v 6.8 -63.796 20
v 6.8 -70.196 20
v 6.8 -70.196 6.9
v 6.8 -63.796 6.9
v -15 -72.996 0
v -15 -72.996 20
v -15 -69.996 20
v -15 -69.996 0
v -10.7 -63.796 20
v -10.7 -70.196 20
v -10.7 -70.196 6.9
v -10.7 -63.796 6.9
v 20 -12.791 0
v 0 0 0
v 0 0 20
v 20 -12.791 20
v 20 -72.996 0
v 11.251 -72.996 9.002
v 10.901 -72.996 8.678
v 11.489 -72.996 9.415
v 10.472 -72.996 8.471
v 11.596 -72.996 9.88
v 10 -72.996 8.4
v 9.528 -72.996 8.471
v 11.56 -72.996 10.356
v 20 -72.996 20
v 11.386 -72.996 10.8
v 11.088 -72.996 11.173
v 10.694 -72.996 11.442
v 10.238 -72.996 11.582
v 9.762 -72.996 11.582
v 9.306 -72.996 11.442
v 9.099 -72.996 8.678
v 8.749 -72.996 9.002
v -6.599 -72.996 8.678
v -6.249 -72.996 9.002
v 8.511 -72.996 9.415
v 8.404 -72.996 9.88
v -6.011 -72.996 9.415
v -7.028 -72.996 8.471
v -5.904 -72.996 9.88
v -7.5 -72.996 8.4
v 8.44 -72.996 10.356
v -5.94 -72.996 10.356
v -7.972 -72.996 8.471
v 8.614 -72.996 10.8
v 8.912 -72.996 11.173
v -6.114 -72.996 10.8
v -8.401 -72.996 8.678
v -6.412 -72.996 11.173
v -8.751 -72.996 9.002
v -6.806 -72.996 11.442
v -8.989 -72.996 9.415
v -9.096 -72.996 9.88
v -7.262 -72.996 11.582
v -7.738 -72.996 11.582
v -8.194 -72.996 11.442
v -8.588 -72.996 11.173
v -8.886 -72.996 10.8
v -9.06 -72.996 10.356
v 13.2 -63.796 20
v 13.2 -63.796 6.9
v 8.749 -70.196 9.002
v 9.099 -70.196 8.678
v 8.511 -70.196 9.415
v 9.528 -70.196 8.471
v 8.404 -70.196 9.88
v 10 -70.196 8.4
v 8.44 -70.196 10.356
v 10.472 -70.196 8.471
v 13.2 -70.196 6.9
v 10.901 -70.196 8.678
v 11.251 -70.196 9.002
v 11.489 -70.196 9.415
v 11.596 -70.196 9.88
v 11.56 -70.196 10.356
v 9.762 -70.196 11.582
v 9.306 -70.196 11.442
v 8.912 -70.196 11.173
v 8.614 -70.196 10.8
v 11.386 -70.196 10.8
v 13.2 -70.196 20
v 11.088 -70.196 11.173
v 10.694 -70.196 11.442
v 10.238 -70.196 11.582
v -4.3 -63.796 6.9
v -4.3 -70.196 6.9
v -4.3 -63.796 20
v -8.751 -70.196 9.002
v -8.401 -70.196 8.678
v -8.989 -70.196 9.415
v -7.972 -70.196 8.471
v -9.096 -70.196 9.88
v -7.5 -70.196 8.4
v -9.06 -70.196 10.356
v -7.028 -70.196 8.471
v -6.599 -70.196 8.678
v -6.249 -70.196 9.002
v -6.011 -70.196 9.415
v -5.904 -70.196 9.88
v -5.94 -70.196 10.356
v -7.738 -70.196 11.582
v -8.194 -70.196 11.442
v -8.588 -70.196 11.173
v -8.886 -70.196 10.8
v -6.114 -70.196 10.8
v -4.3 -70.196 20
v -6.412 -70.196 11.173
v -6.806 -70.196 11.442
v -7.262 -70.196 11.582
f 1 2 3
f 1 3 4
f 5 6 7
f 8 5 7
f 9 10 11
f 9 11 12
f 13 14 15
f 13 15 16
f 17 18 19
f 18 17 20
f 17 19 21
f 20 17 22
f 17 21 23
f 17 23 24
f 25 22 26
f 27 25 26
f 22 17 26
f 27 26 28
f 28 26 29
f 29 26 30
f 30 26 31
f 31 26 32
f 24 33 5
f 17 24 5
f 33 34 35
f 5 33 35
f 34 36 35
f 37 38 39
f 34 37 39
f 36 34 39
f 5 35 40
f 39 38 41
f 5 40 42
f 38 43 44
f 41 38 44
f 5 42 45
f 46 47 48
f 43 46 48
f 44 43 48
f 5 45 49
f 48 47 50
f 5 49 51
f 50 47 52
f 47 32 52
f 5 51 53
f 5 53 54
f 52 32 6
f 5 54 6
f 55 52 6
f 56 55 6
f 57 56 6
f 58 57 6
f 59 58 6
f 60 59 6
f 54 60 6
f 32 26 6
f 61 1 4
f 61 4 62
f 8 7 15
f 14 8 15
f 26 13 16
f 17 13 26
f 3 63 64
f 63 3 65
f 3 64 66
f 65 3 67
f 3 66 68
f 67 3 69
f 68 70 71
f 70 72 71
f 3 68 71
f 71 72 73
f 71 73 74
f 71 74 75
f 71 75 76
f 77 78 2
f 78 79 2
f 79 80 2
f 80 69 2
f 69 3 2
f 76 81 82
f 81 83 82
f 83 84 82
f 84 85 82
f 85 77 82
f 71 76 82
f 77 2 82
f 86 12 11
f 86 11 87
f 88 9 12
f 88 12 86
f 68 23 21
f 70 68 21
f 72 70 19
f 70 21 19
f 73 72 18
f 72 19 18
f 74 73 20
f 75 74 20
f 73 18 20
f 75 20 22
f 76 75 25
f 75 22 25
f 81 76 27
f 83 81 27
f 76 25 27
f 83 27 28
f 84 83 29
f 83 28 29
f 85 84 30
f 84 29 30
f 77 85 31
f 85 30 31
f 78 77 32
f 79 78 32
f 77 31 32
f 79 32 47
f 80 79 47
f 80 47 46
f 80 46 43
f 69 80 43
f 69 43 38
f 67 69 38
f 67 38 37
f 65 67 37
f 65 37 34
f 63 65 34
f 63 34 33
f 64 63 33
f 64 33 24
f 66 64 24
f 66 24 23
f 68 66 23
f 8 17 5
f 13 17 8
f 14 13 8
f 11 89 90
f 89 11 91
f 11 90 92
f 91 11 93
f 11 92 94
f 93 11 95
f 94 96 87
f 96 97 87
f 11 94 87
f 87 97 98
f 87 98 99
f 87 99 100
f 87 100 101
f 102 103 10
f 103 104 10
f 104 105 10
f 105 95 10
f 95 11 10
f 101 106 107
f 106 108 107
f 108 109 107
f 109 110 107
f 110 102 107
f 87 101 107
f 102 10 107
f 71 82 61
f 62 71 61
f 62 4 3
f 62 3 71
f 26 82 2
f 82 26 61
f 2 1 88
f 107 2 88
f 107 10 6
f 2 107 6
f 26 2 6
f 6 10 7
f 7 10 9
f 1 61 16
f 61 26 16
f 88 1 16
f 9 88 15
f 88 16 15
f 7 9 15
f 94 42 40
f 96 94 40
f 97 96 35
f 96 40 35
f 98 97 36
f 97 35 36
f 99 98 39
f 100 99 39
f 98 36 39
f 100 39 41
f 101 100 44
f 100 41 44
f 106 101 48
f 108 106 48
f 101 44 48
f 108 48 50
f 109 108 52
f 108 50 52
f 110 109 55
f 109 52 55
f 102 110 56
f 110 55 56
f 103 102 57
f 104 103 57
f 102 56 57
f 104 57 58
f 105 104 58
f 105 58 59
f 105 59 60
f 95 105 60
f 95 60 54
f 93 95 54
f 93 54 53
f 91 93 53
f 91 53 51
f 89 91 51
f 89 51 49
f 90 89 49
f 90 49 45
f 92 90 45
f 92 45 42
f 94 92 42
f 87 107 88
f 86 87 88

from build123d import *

# Parameters (mm, degrees)
EXTRUDE_1_DEPTH     = 20
EXTRUDE_2_DEPTH     = 20
SKETCH_11_W         = 6.4
SKETCH_11_H         = 6.4
CUT_EXTRUDE_2_DEPTH = 13.1
SKETCH_4_R          = 1.6
CUT_EXTRUDE_1_DEPTH = 9.2


with BuildPart() as part:
    # 草图3 → 凸台-拉伸1 (new body)
    with BuildSketch(Plane.XY):
        Polygon((0, 0), (20, -12.790533612), (20, -72.995577455), (0, -72.995577455), align=None)
    extrude(amount=EXTRUDE_1_DEPTH)

    # 草图6 → 凸台-拉伸2 (add)
    with BuildSketch(Plane.XY.offset(20)):
        Polygon((0, -72.995577455), (-15, -72.995577455), (-15, -69.995577455), (0, 0), (0, -69.995577455), align=None)
    extrude(amount=-EXTRUDE_2_DEPTH)

    # 草图11 → 切除-拉伸2 (cut)
    with BuildSketch(Plane.XY.offset(20)):
        with Locations((-7.5, -66.995577455)):
            Rectangle(SKETCH_11_W, SKETCH_11_H)
        with Locations((10, -66.995577455)):
            Rectangle(SKETCH_11_W, SKETCH_11_H)
    extrude(amount=-CUT_EXTRUDE_2_DEPTH, mode=Mode.SUBTRACT)

    # 草图4 → 切除-拉伸1 (cut)
    with BuildSketch(Plane.XZ.offset(72.995577455)):
        with Locations(Location((10, 10, 0), (0, 0, 270))):
            Circle(SKETCH_4_R)
        with Locations(Location((-7.5, 10, 0), (0, 0, 270))):
            Circle(SKETCH_4_R)
    extrude(amount=-CUT_EXTRUDE_1_DEPTH, mode=Mode.SUBTRACT)


solid = part.part
